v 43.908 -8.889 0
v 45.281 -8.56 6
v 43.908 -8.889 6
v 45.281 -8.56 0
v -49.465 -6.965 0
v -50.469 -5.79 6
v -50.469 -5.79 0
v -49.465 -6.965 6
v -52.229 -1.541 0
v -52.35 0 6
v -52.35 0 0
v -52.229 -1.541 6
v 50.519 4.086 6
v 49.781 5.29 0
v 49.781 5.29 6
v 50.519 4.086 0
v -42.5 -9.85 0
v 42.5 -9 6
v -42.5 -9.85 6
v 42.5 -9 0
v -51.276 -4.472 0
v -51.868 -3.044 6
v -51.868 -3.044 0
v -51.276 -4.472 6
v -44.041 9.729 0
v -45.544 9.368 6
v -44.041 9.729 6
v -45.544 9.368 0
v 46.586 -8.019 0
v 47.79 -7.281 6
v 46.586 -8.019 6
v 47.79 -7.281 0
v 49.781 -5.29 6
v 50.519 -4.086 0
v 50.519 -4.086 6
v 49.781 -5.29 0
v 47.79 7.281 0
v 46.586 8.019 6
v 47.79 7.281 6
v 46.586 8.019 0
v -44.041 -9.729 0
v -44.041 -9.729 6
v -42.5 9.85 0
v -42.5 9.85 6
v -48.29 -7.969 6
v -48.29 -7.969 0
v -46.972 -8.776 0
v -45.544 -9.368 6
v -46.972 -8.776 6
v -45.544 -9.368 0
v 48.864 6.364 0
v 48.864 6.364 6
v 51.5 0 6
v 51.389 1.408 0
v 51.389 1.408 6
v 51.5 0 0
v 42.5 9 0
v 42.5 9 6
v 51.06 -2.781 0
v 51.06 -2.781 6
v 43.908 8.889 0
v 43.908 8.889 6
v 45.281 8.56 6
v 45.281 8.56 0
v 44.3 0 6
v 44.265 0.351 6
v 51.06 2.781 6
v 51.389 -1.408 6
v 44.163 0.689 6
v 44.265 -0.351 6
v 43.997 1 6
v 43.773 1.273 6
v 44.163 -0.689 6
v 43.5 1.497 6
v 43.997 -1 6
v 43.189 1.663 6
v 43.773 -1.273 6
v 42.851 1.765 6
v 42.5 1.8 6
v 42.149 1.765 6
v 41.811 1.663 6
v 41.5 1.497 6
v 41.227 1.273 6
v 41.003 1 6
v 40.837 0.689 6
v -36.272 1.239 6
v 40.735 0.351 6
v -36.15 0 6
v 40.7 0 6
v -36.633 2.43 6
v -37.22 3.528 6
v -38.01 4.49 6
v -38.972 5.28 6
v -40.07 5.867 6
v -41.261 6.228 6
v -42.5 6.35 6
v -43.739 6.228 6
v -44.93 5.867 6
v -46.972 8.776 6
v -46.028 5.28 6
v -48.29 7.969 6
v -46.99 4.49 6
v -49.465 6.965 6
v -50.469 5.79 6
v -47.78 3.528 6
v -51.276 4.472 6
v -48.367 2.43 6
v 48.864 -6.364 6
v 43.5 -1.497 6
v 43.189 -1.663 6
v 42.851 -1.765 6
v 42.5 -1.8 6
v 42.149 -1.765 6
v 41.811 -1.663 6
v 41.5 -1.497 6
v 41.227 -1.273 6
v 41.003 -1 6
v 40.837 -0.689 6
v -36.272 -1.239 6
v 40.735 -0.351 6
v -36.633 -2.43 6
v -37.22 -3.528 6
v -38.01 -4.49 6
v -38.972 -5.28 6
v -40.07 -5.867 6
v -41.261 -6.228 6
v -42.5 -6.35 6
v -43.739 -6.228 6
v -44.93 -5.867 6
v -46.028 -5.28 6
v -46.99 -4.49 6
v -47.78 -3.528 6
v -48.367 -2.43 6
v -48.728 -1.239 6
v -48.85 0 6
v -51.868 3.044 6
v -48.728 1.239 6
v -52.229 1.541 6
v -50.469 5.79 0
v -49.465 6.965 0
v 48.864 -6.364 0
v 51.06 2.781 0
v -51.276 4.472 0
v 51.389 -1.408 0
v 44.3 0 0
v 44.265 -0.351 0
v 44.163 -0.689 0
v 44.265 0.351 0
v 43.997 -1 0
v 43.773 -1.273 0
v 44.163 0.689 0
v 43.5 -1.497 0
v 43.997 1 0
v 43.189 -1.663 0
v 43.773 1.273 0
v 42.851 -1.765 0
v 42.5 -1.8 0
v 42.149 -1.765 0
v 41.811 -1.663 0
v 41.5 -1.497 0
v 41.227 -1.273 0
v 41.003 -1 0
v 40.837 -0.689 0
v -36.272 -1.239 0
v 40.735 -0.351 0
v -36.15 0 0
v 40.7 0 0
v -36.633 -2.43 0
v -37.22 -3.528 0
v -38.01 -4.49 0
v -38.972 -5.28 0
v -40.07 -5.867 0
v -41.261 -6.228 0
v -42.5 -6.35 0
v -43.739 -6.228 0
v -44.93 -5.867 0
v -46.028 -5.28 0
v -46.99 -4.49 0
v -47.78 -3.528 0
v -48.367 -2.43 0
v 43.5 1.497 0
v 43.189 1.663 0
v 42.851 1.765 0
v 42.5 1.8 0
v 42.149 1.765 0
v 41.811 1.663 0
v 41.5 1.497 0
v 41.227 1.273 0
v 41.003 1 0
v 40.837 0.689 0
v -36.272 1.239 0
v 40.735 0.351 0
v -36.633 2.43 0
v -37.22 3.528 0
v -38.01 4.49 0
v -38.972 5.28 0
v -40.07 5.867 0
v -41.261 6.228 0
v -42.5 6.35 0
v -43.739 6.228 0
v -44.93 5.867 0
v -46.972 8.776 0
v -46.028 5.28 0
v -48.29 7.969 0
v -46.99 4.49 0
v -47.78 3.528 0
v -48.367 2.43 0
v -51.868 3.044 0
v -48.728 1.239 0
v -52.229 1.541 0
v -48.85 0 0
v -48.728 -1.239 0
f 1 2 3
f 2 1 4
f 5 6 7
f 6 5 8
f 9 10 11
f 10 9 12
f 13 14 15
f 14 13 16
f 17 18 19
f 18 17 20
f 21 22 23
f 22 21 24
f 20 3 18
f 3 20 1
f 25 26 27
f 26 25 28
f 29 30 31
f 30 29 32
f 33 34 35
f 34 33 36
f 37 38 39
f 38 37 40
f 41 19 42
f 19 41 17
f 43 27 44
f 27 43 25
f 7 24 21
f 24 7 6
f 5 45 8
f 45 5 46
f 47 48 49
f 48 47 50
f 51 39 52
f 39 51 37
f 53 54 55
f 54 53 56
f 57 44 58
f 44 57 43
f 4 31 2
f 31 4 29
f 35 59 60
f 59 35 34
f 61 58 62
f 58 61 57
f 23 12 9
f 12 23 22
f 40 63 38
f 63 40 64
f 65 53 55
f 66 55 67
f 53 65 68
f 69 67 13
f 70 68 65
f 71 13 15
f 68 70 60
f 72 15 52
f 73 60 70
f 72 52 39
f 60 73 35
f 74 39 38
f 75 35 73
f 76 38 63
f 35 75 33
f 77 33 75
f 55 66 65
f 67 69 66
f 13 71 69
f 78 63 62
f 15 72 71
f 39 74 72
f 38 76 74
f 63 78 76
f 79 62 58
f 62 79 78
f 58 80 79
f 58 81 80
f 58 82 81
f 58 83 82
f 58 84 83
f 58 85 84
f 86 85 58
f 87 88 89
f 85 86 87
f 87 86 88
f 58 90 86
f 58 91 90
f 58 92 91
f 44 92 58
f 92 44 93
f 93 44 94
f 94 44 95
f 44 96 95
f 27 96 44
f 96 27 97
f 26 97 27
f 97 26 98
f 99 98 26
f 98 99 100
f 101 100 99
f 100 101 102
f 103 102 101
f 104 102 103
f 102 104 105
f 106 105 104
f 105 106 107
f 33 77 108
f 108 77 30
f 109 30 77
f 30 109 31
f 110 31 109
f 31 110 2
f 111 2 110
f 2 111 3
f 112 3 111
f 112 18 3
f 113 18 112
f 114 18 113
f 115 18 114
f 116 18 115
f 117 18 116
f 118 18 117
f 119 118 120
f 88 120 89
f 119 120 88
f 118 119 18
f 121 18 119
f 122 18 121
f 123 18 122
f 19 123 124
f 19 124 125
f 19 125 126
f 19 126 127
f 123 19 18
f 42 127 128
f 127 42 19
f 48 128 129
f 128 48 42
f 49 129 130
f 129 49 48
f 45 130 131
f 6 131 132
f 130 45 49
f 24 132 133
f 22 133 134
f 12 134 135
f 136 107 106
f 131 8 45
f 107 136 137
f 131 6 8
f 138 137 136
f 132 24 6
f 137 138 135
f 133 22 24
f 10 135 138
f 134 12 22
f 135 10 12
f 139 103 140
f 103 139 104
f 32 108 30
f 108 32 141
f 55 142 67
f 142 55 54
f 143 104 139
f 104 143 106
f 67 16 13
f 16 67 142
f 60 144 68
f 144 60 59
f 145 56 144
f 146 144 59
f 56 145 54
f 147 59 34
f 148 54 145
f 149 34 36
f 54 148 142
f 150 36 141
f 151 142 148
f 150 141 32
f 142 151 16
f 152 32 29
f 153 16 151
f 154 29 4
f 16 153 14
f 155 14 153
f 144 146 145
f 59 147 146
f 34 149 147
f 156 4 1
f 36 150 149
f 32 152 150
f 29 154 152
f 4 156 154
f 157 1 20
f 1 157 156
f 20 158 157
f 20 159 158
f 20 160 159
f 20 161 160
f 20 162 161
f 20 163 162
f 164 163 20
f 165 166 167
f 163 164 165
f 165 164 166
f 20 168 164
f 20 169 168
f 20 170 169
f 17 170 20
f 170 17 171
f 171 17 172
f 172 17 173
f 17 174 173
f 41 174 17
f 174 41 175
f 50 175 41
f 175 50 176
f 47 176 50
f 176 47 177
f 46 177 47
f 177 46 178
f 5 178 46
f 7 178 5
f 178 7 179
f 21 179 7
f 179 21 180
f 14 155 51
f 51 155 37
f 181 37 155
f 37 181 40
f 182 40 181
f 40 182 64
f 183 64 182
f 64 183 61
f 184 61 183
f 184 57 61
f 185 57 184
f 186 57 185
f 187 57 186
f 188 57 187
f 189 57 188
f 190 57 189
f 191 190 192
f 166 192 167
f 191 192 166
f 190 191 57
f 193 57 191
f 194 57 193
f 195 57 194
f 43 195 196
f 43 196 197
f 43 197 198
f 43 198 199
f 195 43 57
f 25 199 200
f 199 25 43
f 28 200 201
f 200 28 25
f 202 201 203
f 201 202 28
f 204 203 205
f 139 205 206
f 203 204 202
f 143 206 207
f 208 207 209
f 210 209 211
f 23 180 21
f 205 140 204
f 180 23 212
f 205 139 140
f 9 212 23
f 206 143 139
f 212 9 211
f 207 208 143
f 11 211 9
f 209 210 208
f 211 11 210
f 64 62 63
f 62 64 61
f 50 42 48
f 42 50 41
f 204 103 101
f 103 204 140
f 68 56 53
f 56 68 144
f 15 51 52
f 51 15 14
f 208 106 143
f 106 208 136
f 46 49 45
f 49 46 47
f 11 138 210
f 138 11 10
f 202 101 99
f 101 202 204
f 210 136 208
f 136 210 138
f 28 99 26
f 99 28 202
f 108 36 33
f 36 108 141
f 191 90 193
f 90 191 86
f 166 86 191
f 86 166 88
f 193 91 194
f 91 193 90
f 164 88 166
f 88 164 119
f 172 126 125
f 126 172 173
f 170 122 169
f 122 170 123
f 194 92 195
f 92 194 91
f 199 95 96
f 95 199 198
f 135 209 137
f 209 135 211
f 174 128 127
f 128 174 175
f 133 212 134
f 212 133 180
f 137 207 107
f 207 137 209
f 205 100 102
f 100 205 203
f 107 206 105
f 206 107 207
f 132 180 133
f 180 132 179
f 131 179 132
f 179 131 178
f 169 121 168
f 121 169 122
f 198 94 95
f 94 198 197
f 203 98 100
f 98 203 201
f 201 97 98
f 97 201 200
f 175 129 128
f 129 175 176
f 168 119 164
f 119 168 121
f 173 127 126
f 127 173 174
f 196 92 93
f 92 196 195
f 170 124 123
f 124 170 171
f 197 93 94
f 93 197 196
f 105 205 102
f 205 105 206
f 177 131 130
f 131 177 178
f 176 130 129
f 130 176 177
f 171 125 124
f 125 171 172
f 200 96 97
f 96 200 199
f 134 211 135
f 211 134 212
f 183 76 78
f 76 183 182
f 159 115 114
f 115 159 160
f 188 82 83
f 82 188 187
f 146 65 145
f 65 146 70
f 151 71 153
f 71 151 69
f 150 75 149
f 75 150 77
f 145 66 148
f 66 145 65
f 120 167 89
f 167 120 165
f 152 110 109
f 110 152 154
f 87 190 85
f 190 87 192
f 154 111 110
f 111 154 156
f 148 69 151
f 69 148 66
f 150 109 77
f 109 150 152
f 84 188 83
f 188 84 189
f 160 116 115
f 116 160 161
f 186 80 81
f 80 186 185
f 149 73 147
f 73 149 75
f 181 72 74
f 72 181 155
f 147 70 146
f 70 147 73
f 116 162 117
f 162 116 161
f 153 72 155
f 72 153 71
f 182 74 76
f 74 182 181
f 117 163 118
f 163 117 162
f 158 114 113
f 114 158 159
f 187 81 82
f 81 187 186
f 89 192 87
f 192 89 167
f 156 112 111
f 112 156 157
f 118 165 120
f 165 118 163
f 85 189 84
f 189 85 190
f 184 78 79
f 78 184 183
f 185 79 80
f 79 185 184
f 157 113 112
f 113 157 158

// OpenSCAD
$fn = 32;

// ----------------------------------------------------------------------
// Lever: 85 mm between the bosses, 6 mm thick, smooth outline
// ----------------------------------------------------------------------

// --- parameters (mm) ---
lever_l = 85;             // distance between the boss centres
boss_a = 19.7;            // first boss diameter
boss_b = 18;              // second boss diameter
bore_a = 12.7;            // first bore
bore_b = 3.6;             // second bore
lever_t = 6;              // lever thickness

lever_profile = [[-52.35, 0], [-52.229, -1.541], [-51.868, -3.044], [-51.276, -4.472], [-50.469, -5.79], [-49.465, -6.965], [-48.29, -7.969], [-46.972, -8.776], [-45.544, -9.368], [-44.041, -9.729], [-42.5, -9.85], [42.5, -9], [43.908, -8.889], [45.281, -8.56], [46.586, -8.019], [47.79, -7.281], [48.864, -6.364], [49.781, -5.29], [50.519, -4.086], [51.06, -2.781], [51.389, -1.408], [51.5, 0], [51.389, 1.408], [51.06, 2.781], [50.519, 4.086], [49.781, 5.29], [48.864, 6.364], [47.79, 7.281], [46.586, 8.019], [45.281, 8.56], [43.908, 8.889], [42.5, 9], [-42.5, 9.85], [-44.041, 9.729], [-45.544, 9.368], [-46.972, 8.776], [-48.29, 7.969], [-49.465, 6.965], [-50.469, 5.79], [-51.276, 4.472], [-51.868, 3.044], [-52.229, 1.541]];

difference() {
  linear_extrude(height = lever_t) polygon(lever_profile);
  translate([-42.5, 0, -2.5]) cylinder(h = lever_t + 5, d = bore_a);
  translate([42.5, 0, -2.5]) cylinder(h = lever_t + 5, d = bore_b);
}
